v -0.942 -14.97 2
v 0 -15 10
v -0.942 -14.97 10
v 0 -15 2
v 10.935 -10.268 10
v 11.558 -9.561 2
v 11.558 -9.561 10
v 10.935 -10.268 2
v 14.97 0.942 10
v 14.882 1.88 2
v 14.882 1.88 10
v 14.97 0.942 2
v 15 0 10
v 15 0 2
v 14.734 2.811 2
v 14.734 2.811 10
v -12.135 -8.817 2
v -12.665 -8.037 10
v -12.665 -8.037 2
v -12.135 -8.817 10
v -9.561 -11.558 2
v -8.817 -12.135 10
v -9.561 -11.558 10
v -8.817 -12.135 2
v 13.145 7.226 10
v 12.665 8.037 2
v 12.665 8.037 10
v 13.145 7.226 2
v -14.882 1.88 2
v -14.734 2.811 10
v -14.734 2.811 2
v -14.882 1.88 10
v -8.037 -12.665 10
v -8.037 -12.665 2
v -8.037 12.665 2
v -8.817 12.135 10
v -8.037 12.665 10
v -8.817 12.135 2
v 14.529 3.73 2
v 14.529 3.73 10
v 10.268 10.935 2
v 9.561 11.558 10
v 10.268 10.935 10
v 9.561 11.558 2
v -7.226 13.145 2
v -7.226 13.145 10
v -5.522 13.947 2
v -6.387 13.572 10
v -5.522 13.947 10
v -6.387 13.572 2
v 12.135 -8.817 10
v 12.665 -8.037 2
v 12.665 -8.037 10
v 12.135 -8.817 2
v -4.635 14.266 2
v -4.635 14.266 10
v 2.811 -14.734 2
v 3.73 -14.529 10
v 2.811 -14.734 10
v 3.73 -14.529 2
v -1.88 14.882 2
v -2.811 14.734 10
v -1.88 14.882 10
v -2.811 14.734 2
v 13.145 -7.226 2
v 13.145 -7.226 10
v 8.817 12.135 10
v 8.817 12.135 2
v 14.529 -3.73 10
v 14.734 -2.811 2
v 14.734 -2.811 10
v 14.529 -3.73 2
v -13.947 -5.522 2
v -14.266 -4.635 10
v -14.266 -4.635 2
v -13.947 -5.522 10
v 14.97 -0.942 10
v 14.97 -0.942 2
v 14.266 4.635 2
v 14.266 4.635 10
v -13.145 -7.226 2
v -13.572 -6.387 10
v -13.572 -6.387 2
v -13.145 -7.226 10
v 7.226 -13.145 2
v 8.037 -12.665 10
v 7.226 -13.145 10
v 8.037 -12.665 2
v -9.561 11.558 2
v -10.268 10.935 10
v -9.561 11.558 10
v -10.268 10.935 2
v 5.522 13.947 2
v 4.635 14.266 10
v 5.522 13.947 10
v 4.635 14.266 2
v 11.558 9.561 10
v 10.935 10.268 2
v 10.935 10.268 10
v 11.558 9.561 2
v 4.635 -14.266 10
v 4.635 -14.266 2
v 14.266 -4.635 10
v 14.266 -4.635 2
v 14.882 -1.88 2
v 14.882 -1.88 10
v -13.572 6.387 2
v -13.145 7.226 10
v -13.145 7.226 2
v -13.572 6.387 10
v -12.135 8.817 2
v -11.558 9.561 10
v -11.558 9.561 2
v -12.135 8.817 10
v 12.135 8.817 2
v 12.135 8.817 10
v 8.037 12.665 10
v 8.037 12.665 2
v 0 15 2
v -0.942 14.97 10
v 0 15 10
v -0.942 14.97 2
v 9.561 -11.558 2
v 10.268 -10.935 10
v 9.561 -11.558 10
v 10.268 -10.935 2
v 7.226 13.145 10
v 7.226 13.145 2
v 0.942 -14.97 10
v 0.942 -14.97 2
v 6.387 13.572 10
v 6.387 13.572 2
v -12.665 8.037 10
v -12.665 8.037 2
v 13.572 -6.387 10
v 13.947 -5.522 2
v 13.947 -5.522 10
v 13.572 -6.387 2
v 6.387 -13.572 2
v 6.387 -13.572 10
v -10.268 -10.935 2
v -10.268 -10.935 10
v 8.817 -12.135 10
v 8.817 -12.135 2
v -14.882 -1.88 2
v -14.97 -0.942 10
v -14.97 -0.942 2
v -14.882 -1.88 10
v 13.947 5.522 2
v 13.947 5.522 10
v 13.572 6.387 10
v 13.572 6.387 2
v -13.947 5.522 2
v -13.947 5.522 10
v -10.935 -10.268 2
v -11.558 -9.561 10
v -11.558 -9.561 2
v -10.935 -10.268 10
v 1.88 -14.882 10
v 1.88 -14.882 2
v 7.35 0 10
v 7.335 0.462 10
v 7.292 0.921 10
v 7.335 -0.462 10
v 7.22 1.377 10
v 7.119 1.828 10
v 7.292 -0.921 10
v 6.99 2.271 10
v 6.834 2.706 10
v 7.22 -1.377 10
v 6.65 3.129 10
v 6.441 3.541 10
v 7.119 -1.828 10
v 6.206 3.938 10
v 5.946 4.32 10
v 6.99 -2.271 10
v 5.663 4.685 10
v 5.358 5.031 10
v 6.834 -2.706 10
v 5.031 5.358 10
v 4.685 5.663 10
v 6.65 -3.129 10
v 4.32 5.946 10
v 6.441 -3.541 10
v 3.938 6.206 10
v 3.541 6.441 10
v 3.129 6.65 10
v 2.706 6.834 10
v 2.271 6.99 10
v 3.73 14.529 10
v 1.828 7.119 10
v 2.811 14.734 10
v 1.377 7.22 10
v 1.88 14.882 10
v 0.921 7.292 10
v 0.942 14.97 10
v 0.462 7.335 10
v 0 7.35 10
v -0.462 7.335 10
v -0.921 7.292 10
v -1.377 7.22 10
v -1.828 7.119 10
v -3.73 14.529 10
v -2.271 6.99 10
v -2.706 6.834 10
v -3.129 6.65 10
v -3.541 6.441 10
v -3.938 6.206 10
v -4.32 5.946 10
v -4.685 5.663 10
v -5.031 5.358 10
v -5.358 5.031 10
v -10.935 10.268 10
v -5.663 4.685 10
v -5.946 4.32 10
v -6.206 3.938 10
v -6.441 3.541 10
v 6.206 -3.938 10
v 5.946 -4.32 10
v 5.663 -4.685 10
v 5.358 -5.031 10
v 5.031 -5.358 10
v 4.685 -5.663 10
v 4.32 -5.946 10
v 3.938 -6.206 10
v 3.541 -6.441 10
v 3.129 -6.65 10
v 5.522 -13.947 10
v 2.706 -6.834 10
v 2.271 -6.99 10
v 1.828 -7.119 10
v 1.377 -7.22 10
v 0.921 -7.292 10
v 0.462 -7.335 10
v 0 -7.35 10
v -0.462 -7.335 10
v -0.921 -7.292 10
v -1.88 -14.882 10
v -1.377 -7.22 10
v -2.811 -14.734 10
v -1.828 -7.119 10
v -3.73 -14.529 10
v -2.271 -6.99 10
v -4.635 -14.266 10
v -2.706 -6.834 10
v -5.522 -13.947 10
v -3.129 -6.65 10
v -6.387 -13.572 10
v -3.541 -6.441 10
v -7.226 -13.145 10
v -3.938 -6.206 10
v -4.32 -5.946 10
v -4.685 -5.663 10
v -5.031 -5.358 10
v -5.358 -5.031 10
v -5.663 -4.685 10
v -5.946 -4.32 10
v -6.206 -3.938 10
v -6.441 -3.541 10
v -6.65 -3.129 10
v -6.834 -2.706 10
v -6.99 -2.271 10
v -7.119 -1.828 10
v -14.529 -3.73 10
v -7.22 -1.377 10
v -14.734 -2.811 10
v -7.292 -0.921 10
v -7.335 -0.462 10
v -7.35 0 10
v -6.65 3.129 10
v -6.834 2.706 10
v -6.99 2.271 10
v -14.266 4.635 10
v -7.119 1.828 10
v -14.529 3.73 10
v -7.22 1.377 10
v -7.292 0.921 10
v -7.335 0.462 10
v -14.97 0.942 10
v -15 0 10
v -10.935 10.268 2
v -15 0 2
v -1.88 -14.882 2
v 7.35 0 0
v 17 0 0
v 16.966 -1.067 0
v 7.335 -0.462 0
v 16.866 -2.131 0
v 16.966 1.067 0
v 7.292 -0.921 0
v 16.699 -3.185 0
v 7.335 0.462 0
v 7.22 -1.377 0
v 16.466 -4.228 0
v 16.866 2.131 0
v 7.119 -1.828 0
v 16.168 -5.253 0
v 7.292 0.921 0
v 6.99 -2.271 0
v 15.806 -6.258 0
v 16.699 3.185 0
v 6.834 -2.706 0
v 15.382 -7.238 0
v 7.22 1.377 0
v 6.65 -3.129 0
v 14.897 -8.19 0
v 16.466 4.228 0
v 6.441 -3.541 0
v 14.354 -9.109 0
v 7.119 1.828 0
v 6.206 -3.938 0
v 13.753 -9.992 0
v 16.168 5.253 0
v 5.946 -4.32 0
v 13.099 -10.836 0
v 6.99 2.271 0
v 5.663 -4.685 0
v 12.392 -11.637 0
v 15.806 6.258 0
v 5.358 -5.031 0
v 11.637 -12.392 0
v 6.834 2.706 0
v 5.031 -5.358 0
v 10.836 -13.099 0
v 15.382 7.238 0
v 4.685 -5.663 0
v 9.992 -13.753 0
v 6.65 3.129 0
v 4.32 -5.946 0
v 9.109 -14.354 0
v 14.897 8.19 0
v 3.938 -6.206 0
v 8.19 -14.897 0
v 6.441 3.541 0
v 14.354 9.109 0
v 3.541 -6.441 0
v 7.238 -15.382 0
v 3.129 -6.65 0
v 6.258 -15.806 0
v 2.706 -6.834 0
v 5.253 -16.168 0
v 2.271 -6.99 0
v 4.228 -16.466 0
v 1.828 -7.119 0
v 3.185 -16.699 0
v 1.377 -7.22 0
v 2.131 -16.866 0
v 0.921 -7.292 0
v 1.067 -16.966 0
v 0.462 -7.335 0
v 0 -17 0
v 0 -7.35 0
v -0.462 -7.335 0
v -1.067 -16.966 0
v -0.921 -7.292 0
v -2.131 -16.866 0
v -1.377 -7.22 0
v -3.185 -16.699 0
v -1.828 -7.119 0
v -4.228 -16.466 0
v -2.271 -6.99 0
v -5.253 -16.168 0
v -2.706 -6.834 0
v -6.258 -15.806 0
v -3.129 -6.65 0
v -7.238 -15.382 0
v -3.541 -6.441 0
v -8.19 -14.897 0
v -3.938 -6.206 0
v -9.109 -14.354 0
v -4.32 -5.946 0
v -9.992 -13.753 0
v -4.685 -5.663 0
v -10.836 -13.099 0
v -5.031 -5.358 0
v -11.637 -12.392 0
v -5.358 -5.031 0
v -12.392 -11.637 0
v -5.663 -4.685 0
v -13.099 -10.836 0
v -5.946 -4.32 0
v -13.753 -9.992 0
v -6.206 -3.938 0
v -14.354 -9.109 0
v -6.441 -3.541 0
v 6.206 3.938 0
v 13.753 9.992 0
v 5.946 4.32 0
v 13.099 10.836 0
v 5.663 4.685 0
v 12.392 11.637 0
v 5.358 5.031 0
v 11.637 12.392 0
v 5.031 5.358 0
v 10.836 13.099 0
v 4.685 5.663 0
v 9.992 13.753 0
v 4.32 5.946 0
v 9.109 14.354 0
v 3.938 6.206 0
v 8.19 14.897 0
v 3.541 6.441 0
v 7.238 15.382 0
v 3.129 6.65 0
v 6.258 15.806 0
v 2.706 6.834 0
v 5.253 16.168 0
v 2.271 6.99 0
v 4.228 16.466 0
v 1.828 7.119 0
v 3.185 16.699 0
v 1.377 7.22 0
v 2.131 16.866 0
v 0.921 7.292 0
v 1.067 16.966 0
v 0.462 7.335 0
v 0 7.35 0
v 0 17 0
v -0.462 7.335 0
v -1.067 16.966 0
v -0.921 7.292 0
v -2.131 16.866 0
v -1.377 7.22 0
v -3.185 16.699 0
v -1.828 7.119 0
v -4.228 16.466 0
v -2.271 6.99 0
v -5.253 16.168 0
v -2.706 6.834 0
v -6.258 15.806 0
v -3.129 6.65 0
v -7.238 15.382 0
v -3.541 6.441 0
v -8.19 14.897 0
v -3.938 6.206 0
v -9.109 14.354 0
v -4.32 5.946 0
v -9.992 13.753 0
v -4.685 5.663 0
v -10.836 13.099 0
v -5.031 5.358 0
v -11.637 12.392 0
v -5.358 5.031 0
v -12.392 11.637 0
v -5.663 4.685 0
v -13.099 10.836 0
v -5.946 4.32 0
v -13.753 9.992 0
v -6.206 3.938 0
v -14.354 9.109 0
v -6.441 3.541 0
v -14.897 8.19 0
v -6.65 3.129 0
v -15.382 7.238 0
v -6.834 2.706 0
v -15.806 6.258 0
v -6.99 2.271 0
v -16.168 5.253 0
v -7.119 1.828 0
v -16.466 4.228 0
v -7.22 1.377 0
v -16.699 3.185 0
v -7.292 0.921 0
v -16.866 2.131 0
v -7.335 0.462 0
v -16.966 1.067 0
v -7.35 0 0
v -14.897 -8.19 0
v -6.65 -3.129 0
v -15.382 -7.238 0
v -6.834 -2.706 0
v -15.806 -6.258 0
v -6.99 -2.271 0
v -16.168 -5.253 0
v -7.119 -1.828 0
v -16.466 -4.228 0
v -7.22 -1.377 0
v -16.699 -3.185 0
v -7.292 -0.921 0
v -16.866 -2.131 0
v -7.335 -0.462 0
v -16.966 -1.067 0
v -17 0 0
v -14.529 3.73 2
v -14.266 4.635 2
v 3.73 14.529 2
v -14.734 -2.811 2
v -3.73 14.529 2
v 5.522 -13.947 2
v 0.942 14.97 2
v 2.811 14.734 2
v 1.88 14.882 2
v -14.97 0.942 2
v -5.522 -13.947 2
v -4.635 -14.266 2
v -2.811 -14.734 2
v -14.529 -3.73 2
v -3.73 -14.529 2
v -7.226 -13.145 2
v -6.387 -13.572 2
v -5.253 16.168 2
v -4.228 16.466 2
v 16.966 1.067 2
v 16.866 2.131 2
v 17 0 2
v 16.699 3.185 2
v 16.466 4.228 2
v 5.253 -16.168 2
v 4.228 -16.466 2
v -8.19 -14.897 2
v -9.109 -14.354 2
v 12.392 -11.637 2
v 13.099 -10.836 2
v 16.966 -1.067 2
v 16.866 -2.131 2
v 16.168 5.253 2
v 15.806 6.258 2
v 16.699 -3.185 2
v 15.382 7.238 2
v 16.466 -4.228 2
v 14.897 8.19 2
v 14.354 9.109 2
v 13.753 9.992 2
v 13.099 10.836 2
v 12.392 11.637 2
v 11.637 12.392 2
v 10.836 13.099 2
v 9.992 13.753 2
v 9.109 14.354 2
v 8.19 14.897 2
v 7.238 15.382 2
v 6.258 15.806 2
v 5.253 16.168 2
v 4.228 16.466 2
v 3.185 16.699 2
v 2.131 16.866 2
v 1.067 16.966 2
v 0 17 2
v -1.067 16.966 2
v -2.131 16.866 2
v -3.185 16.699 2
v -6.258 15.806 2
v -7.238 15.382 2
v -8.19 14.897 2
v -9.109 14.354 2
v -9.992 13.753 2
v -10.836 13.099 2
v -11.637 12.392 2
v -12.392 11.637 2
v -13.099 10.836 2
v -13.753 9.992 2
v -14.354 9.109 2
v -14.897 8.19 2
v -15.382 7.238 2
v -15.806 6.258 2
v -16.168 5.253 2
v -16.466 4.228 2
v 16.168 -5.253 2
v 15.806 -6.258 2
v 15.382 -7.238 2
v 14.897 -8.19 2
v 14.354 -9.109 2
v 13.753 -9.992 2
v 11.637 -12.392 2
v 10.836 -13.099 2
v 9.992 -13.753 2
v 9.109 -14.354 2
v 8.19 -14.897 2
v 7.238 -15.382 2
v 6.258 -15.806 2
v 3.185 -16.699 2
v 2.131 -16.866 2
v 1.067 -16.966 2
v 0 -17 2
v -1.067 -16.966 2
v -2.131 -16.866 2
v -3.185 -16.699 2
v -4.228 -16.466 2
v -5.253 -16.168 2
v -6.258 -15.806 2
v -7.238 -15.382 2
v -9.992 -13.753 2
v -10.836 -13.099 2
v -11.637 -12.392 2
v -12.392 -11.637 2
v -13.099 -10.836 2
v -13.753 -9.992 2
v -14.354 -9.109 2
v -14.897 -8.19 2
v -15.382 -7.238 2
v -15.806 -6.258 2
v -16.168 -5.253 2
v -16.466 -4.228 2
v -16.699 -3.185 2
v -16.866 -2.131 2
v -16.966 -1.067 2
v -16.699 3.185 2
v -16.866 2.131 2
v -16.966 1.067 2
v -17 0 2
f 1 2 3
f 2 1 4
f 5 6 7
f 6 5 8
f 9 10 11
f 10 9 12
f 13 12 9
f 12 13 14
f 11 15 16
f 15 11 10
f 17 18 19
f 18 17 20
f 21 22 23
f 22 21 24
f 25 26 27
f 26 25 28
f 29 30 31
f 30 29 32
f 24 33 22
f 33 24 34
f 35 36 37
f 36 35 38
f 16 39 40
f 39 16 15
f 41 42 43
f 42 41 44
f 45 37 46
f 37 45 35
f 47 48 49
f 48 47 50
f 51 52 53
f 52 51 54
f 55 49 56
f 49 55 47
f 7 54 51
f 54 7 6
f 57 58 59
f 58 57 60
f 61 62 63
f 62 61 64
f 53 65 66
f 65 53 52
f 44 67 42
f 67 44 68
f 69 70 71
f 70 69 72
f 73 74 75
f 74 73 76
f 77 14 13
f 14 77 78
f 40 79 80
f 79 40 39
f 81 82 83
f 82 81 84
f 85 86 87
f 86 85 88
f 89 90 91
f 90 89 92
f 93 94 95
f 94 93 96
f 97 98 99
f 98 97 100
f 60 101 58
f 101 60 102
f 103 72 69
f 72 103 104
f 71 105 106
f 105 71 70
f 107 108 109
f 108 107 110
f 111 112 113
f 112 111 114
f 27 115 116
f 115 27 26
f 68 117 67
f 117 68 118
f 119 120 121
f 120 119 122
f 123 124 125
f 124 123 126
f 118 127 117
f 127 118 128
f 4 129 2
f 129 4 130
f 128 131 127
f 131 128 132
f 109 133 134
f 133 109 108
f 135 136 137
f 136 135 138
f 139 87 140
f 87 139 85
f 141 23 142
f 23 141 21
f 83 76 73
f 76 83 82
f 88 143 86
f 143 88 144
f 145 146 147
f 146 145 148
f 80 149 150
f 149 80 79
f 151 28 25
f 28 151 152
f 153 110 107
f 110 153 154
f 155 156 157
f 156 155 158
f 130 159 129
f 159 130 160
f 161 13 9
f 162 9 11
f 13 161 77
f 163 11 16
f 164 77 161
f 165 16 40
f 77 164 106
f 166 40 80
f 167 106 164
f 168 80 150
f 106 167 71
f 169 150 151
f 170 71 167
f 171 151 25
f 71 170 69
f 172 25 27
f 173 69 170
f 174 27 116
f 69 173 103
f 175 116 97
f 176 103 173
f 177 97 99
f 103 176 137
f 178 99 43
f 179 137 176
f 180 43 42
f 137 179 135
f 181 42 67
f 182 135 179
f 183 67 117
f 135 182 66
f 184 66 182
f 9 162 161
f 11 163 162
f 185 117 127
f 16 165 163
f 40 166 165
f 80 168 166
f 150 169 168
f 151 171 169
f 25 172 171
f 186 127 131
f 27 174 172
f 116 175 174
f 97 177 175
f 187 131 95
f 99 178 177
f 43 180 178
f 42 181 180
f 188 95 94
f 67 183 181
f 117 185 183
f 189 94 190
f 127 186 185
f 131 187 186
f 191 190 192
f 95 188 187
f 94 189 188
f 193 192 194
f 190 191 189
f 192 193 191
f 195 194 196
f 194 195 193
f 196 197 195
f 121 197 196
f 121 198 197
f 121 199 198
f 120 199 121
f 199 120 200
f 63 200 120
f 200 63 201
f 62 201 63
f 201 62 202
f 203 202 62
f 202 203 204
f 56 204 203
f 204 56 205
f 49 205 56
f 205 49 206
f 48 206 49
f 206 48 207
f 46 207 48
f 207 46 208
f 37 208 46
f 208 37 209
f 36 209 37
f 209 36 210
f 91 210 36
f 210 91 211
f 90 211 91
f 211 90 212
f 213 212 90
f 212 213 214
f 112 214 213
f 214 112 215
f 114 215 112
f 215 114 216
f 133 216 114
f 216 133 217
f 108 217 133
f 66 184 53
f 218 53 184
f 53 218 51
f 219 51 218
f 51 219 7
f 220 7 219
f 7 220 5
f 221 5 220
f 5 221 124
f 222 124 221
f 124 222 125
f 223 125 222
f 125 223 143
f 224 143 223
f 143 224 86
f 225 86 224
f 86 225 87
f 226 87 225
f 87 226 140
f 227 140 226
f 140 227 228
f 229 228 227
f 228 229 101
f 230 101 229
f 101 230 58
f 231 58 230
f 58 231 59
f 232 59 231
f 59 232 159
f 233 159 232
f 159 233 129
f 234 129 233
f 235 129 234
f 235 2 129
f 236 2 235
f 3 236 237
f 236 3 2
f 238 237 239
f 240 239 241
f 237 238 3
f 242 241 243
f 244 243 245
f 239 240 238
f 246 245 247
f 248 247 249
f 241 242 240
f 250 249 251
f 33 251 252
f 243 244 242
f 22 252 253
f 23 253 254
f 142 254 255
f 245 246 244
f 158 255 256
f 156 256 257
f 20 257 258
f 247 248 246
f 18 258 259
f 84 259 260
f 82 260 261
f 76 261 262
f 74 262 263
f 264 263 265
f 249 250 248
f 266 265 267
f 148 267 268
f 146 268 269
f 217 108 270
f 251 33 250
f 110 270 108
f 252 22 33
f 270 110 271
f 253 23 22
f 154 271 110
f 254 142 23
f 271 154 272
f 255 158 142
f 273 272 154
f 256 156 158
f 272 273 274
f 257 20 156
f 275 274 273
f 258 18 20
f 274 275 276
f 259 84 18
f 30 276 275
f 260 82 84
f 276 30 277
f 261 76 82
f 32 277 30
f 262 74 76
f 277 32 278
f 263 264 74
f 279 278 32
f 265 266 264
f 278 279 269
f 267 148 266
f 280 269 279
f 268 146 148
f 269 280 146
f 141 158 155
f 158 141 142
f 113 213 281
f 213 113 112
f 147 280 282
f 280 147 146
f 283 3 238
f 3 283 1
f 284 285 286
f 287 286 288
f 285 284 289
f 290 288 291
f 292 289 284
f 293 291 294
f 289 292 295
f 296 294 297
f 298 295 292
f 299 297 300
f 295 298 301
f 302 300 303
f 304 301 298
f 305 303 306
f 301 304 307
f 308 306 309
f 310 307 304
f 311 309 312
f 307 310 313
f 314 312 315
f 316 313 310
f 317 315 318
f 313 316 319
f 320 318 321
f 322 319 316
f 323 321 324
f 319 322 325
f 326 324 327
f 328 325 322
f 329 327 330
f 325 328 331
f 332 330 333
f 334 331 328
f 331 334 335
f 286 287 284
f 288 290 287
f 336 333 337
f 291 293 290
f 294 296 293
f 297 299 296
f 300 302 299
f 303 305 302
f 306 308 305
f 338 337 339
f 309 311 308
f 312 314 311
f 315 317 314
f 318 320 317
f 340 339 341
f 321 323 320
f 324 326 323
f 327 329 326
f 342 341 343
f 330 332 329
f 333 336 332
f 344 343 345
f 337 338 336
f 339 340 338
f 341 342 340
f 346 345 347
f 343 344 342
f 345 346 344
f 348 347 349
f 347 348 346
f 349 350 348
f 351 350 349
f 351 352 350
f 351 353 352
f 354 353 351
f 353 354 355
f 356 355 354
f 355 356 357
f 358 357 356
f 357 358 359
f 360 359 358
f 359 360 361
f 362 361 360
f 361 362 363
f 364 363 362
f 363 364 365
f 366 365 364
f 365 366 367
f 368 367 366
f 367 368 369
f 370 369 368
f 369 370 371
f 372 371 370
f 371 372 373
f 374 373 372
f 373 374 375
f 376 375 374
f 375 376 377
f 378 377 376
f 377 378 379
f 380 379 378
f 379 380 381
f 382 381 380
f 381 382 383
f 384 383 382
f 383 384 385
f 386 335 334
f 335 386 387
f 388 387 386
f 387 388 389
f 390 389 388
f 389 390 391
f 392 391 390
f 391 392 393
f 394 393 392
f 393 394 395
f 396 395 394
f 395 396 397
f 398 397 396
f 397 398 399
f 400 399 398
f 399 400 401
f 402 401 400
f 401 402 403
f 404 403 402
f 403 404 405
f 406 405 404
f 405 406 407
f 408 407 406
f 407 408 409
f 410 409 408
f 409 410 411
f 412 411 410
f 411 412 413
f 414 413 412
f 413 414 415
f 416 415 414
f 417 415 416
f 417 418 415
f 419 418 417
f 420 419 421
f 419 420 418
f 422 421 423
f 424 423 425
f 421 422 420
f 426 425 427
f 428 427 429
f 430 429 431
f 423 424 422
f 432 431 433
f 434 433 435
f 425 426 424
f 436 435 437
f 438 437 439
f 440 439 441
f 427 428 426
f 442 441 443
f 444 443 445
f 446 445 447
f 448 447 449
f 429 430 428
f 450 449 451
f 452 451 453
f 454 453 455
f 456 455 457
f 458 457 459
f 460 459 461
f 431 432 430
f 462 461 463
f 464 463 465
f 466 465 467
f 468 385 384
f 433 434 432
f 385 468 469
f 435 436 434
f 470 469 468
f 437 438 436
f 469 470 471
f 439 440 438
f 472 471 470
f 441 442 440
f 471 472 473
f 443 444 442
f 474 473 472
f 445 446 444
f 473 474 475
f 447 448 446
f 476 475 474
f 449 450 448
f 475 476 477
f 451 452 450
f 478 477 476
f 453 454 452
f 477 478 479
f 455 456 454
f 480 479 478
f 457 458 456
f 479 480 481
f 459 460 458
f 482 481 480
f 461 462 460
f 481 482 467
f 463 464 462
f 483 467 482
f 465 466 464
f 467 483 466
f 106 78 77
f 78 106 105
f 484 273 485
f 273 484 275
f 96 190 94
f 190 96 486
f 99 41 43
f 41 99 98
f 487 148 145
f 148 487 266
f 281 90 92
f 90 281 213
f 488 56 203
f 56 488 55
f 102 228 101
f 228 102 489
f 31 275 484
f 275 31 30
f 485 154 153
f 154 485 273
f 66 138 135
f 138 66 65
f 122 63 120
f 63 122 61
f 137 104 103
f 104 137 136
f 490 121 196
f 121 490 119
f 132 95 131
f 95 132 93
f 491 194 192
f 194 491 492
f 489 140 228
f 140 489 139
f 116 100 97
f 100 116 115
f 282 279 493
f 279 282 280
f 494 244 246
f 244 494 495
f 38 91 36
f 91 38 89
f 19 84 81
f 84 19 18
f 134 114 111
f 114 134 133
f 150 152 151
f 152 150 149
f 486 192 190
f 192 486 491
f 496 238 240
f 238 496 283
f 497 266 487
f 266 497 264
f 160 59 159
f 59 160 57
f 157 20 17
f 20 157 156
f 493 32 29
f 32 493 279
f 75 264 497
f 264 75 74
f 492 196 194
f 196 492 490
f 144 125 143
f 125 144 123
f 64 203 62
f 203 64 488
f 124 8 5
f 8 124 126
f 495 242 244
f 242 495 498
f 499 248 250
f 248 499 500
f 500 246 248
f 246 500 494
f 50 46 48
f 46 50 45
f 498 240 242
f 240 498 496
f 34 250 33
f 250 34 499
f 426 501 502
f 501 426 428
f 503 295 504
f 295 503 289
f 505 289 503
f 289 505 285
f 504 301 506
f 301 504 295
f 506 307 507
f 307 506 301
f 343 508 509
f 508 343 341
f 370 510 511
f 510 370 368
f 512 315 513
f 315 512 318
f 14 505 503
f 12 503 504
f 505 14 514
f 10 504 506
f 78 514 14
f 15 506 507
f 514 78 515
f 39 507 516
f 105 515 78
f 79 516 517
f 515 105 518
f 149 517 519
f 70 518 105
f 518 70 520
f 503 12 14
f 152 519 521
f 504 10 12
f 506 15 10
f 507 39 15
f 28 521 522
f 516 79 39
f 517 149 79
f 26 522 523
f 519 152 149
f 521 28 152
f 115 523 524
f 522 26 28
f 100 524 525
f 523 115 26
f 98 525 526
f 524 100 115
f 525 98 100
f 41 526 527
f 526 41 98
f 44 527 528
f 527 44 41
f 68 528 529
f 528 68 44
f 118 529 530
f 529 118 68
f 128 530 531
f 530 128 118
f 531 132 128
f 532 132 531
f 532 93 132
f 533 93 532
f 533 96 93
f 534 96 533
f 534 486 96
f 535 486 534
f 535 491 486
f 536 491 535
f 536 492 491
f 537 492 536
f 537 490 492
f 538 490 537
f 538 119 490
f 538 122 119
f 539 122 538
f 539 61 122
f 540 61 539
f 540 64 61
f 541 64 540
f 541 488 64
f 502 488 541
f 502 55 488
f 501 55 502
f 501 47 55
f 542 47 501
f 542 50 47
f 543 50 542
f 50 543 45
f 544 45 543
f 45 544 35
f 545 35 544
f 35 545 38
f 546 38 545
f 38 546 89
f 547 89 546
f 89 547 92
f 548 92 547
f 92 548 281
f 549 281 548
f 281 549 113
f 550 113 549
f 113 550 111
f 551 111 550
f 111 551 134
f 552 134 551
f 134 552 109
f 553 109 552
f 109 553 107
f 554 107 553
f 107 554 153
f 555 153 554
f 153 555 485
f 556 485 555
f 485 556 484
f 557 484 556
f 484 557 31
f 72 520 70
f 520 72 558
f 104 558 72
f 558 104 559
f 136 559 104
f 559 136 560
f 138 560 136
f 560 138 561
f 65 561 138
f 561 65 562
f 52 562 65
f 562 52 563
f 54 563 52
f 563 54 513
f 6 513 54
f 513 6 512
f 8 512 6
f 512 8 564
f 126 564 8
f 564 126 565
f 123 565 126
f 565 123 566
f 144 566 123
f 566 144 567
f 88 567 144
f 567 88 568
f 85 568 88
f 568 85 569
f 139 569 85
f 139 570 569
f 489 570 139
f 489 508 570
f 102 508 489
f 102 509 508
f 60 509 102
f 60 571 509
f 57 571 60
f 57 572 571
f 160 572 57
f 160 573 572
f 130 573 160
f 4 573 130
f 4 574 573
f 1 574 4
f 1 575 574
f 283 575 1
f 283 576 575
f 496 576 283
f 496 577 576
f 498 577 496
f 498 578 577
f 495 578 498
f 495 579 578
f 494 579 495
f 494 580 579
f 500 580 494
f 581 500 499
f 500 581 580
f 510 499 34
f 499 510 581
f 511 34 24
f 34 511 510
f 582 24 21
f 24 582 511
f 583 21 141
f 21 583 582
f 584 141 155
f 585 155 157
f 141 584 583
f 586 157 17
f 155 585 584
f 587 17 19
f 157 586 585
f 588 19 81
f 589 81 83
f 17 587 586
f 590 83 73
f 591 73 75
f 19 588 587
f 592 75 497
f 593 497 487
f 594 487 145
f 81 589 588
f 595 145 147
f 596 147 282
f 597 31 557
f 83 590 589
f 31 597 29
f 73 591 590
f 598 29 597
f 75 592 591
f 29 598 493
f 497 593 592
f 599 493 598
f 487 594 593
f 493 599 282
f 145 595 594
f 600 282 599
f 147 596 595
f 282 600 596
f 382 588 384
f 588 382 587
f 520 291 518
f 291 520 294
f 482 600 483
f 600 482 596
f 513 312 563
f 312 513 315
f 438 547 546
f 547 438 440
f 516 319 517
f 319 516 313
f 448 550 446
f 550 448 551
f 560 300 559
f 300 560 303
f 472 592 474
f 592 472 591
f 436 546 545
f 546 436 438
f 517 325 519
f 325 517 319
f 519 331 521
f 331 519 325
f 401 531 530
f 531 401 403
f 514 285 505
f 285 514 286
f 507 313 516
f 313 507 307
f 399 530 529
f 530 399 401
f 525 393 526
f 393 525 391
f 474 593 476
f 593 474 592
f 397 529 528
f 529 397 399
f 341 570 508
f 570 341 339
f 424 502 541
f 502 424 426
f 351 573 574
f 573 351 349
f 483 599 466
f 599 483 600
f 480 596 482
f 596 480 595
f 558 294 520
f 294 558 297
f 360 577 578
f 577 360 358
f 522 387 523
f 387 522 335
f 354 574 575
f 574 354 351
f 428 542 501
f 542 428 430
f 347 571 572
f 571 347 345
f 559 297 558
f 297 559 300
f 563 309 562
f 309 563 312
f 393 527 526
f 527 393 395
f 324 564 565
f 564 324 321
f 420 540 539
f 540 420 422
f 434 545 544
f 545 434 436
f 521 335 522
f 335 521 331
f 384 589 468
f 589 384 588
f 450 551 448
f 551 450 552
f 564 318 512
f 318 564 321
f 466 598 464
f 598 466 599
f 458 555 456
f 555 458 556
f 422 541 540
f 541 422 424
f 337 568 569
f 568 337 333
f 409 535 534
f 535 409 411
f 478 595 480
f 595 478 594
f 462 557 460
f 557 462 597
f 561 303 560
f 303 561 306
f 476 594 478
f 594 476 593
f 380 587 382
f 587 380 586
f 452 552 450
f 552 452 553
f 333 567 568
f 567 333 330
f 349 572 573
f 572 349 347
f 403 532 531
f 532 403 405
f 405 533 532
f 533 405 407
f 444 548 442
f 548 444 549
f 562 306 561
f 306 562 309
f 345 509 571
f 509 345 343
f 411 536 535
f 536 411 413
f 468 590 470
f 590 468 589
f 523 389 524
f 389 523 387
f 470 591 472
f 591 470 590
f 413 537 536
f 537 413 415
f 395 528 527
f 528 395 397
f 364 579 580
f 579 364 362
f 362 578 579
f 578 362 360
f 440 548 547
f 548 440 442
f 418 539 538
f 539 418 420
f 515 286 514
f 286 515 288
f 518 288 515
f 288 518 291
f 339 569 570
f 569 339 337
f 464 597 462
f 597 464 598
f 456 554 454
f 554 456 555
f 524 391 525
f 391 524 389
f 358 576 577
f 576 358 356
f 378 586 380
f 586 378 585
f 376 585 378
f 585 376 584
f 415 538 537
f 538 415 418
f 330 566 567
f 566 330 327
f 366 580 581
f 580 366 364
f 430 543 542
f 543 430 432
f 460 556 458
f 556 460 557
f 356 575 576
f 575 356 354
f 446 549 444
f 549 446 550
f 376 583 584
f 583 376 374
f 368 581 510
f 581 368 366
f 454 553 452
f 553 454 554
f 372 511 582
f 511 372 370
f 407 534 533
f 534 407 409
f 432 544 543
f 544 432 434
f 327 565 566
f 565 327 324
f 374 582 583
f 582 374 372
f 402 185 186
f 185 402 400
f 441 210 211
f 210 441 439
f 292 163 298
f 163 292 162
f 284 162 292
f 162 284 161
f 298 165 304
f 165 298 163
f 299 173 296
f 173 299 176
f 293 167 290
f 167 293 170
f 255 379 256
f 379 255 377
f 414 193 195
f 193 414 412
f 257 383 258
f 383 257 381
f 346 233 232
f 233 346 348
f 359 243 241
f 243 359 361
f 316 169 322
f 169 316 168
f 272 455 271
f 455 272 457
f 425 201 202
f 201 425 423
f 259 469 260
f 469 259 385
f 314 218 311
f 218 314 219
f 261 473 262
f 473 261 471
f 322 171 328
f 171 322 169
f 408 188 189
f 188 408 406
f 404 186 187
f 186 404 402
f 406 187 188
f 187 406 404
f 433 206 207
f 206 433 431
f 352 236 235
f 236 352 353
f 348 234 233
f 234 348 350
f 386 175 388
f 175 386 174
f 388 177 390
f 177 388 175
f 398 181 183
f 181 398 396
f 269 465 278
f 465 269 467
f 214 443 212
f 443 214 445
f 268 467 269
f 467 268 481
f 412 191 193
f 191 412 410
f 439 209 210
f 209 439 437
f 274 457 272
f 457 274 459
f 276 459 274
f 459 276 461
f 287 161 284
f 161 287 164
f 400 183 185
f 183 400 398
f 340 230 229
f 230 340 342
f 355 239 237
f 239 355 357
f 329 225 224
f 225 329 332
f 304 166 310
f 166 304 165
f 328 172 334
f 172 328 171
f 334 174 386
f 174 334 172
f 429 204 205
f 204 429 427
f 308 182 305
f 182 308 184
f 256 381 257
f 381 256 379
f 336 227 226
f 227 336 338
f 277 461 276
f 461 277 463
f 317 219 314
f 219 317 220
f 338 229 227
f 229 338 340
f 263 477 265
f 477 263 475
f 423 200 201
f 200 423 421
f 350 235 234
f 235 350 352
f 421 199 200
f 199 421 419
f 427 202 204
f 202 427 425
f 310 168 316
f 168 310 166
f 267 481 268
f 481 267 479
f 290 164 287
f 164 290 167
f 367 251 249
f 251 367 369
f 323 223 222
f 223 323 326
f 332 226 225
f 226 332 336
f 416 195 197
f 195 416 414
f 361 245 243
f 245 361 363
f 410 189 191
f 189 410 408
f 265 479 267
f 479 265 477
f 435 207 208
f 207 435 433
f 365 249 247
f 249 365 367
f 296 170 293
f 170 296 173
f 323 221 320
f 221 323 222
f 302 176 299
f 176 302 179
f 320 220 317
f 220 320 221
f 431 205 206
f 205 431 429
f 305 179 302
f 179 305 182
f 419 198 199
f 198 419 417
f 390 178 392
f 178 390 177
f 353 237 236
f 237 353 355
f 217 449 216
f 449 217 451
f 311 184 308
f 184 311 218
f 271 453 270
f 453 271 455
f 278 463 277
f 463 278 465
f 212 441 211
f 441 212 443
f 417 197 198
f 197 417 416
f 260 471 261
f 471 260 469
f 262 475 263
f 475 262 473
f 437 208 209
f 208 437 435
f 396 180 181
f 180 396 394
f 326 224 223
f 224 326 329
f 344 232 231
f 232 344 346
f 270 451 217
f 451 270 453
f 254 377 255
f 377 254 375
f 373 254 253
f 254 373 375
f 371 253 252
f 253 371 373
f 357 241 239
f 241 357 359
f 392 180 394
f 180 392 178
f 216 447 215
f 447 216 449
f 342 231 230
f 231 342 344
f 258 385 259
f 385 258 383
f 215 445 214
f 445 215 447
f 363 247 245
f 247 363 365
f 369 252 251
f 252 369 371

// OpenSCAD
cameraTubeOuterDiameter = 14.2;
cameraTubeHeight = 10;
eyepieceTubeInnerDiameter = 30;
flangeHeight = 2;
flangeWidth = flangeHeight;
eyepieceCuffHeight = 20;
clearance = 0.25;

$fn = 100;
overcut = 0.01;
adapterDiameter = eyepieceTubeInnerDiameter; // clearance is microscope tube
adapterHeight = cameraTubeHeight;

difference() {
    union () {
        cylinder(h=adapterHeight, d=adapterDiameter);
        cylinder(h=flangeHeight, d=adapterDiameter + 2*flangeWidth);
    }
    translate([0,0,-overcut])
        cylinder(h=adapterHeight + 2*overcut, 
            d=cameraTubeOuterDiameter + 2*clearance);
}
